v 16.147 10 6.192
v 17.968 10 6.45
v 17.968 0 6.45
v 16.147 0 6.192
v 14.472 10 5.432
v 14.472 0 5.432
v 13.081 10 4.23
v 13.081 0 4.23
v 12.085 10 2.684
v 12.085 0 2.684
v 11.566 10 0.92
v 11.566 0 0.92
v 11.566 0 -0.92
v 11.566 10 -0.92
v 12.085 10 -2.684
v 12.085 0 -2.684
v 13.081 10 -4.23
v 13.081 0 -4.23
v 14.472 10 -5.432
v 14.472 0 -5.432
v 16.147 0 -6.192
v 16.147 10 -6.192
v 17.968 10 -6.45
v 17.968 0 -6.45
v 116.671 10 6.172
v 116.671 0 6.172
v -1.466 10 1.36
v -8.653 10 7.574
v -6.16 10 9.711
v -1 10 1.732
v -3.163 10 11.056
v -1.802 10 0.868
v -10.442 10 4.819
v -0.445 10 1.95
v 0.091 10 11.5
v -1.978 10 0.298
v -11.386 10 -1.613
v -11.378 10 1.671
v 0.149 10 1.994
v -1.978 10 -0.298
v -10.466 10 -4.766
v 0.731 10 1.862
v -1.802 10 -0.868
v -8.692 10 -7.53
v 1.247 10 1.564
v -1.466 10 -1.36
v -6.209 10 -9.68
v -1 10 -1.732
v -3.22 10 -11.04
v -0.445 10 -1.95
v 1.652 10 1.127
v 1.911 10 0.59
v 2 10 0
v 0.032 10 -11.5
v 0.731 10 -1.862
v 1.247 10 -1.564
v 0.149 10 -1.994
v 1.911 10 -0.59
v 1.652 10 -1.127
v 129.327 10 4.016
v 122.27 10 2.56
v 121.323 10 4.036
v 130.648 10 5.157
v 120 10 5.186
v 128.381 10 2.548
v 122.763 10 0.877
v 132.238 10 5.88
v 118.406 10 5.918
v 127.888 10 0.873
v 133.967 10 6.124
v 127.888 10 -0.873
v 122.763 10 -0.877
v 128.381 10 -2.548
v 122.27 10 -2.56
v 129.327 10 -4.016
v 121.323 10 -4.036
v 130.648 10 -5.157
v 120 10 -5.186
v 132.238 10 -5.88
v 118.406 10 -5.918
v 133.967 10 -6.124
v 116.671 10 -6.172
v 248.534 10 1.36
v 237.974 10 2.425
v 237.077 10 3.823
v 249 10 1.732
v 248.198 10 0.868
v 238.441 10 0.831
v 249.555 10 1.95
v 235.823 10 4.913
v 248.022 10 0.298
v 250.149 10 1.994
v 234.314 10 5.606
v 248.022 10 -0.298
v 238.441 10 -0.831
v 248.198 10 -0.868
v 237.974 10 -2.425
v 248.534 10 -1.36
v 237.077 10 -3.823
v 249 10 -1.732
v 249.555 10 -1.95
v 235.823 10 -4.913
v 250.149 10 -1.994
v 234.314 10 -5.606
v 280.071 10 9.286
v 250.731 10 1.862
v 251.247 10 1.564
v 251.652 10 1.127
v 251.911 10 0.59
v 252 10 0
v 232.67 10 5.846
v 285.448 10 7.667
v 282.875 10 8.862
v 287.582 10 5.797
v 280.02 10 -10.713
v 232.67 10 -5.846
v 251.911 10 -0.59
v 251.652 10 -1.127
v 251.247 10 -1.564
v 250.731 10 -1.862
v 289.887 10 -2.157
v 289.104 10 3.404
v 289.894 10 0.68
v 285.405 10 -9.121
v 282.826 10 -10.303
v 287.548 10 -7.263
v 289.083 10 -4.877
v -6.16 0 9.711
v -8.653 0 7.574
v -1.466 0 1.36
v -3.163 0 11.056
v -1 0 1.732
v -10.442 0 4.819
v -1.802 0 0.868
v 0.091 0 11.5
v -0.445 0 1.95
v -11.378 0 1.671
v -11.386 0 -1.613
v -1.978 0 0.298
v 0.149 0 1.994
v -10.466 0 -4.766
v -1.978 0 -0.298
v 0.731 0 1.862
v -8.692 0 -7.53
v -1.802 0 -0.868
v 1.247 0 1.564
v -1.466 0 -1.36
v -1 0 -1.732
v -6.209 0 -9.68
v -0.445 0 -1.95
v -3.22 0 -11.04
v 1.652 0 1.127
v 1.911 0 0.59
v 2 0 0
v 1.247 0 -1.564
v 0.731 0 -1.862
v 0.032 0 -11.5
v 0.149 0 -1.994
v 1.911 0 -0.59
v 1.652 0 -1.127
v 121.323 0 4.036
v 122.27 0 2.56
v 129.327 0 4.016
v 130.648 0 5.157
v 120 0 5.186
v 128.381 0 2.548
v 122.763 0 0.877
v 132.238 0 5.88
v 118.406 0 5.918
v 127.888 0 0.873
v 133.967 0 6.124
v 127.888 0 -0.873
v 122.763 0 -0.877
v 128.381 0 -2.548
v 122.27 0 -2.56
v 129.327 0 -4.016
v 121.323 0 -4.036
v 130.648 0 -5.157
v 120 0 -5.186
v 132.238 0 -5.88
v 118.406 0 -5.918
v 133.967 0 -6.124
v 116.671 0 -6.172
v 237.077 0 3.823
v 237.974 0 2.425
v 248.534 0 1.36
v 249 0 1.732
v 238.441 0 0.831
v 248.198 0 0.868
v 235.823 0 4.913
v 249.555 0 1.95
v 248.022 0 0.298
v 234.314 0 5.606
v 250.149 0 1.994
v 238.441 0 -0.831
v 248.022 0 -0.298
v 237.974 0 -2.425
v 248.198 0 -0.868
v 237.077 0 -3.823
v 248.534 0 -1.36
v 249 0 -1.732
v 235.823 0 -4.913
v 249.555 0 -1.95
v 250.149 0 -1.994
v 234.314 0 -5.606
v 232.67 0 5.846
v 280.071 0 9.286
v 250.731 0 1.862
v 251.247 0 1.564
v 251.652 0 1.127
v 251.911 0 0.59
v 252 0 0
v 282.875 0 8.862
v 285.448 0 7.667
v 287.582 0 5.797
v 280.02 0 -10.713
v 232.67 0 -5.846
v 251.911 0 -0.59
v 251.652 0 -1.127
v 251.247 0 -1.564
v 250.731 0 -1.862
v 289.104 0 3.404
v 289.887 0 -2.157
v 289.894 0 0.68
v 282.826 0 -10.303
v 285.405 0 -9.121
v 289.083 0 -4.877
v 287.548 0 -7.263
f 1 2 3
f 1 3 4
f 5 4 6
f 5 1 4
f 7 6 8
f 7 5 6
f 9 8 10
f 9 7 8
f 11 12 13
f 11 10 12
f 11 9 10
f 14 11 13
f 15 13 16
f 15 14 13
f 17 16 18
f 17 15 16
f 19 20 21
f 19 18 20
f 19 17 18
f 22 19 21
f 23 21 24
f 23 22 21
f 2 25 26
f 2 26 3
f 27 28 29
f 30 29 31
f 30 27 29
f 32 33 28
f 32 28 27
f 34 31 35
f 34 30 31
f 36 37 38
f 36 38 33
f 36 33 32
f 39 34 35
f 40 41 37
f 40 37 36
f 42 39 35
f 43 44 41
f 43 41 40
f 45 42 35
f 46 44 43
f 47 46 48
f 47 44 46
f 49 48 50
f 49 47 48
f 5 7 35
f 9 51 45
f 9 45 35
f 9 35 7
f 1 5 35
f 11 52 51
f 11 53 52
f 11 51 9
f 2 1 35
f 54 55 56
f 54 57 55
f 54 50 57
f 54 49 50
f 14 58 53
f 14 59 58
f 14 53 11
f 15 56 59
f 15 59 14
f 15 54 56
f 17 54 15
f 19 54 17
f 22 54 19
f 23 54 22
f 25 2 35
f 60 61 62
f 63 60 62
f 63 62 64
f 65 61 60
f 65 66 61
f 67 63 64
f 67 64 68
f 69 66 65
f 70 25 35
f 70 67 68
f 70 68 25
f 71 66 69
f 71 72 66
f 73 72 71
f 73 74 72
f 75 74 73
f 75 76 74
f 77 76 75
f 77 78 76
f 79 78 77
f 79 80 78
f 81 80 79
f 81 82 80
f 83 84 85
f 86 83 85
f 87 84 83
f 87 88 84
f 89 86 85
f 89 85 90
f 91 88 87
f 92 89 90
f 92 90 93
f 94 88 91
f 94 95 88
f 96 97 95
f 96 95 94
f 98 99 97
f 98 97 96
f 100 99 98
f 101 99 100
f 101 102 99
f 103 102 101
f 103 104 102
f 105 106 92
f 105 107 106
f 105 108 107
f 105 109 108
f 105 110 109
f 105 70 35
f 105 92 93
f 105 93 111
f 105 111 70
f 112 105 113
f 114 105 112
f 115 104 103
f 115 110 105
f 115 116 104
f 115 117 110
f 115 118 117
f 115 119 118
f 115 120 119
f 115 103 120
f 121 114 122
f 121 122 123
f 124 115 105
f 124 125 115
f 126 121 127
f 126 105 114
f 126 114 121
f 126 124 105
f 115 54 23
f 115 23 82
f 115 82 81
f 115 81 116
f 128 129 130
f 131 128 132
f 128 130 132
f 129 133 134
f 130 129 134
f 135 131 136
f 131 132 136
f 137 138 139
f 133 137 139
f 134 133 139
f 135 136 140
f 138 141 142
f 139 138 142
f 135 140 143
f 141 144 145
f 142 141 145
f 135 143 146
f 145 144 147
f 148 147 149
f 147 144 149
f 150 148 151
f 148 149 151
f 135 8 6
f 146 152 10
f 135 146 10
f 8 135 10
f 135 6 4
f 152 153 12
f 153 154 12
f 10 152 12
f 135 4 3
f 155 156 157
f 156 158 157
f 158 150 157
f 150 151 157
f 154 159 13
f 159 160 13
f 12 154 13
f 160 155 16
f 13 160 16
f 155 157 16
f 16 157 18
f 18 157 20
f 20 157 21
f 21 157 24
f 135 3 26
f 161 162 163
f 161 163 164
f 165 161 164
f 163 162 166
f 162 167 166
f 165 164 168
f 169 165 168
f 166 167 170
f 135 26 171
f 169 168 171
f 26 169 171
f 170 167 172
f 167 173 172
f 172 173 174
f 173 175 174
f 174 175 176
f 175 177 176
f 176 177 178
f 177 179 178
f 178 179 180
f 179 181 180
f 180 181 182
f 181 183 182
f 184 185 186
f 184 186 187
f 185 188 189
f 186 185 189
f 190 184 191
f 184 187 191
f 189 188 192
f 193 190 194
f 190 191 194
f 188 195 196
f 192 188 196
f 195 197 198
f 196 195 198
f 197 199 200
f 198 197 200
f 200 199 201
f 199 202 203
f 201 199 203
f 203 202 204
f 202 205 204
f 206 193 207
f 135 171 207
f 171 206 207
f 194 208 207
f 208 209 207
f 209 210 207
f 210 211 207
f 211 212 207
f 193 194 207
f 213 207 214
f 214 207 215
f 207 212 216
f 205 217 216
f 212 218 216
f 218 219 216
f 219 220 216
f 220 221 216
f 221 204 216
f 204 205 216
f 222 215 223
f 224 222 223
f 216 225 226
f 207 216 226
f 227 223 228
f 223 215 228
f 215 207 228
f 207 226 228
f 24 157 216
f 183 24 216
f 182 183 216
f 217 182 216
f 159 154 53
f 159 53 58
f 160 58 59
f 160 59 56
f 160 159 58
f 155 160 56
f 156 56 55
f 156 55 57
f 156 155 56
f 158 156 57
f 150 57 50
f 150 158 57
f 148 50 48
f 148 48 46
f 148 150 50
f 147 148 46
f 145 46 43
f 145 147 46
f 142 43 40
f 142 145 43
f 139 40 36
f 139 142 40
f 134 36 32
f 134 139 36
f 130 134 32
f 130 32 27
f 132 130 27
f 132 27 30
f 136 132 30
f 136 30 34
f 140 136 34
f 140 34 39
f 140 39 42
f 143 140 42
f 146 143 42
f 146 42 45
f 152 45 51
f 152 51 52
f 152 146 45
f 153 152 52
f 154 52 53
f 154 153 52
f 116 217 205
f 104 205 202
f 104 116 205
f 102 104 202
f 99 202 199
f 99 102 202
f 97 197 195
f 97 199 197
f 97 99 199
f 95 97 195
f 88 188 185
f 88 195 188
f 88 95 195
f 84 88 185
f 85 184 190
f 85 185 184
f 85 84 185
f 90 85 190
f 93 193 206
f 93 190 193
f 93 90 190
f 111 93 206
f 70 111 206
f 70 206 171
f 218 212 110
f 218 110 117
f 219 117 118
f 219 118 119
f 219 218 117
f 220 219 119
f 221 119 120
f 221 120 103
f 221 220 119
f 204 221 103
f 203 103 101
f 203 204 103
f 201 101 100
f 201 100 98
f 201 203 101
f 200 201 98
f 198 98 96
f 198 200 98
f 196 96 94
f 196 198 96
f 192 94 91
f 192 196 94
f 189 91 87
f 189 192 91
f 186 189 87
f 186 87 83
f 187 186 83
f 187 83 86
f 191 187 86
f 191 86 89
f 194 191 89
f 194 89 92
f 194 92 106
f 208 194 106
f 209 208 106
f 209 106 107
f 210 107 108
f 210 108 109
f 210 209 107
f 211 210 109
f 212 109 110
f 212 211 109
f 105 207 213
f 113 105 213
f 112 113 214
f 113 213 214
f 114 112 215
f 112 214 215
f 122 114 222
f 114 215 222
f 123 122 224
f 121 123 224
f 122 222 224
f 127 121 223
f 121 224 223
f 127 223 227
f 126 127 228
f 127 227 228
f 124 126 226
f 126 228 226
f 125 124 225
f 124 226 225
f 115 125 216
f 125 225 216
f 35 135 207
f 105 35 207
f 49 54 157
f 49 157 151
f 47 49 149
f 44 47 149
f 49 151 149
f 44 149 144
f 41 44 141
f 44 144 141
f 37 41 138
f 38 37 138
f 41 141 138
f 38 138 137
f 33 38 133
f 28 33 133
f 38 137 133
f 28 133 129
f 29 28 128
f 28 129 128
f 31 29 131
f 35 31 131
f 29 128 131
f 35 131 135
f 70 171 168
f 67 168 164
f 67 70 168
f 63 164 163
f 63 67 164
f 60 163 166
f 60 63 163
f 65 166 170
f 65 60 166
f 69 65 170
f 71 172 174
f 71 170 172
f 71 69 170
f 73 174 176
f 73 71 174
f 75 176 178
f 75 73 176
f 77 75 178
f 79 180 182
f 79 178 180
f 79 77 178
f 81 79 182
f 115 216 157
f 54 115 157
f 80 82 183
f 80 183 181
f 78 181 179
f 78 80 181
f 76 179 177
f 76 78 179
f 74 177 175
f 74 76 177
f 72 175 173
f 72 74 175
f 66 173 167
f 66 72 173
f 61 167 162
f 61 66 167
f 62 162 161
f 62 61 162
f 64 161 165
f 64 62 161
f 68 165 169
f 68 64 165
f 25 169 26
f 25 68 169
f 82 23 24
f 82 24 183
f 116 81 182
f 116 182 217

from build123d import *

# Parameters (mm, degrees)
SKETCH1_R           = 2
BOSS_EXTRUDE1_DEPTH = 10
CUT_EXTRUDE1_DEPTH  = 11


with BuildPart() as part:
    # Sketch1 → Boss-Extrude1 (new body)
    with BuildSketch(Plane(origin=(0, 0, 0), x_dir=(1, 0, 0), z_dir=(0, 1, 0))):
        with BuildLine():
            Line((0.090909042, -11.49964067), (280.070567987, -9.286294776))
            ThreePointArc((280.070567987, -9.286294776), (289.991484188, 0.738871766), (280.019610714, 10.7133533))
            Line((280.019610714, 10.7133533), (0.032308177, 11.499954617))
            ThreePointArc((0.032308177, 11.499954617), (-11.499962672, -0.029300853), (0.090909042, -11.49964067))
        make_face()
        with Locations((250, 0)):
            Circle(SKETCH1_R, mode=Mode.SUBTRACT)
        Circle(SKETCH1_R, mode=Mode.SUBTRACT)
    extrude(amount=BOSS_EXTRUDE1_DEPTH)

    # Sketch2 → Cut-Extrude1 (cut, through all)
    with BuildSketch(Plane(origin=(0, 10, 0), x_dir=(1, 0, 0), z_dir=(0, 1, 0))):
        with BuildLine():
            Line((17.967691823, 6.449546898), (116.670959066, 6.17224818))
            ThreePointArc((116.670959066, 6.17224818), (122.825891181, 0), (116.670959066, -6.17224818))
            Line((116.670959066, -6.17224818), (17.967691823, -6.449546898))
            ThreePointArc((17.967691823, -6.449546898), (11.5, 0), (17.967691823, 6.449546898))
        make_face()
        with BuildLine():
            Line((133.966776262, 6.123657003), (232.670043506, 5.846358285))
            ThreePointArc((232.670043506, 5.846358285), (238.5, 0), (232.670043506, -5.846358285))
            Line((232.670043506, -5.846358285), (133.966776262, -6.123657003))
            ThreePointArc((133.966776262, -6.123657003), (127.825891181, 0), (133.966776262, 6.123657003))
        make_face()
    extrude(amount=-CUT_EXTRUDE1_DEPTH, mode=Mode.SUBTRACT)


solid = part.part
